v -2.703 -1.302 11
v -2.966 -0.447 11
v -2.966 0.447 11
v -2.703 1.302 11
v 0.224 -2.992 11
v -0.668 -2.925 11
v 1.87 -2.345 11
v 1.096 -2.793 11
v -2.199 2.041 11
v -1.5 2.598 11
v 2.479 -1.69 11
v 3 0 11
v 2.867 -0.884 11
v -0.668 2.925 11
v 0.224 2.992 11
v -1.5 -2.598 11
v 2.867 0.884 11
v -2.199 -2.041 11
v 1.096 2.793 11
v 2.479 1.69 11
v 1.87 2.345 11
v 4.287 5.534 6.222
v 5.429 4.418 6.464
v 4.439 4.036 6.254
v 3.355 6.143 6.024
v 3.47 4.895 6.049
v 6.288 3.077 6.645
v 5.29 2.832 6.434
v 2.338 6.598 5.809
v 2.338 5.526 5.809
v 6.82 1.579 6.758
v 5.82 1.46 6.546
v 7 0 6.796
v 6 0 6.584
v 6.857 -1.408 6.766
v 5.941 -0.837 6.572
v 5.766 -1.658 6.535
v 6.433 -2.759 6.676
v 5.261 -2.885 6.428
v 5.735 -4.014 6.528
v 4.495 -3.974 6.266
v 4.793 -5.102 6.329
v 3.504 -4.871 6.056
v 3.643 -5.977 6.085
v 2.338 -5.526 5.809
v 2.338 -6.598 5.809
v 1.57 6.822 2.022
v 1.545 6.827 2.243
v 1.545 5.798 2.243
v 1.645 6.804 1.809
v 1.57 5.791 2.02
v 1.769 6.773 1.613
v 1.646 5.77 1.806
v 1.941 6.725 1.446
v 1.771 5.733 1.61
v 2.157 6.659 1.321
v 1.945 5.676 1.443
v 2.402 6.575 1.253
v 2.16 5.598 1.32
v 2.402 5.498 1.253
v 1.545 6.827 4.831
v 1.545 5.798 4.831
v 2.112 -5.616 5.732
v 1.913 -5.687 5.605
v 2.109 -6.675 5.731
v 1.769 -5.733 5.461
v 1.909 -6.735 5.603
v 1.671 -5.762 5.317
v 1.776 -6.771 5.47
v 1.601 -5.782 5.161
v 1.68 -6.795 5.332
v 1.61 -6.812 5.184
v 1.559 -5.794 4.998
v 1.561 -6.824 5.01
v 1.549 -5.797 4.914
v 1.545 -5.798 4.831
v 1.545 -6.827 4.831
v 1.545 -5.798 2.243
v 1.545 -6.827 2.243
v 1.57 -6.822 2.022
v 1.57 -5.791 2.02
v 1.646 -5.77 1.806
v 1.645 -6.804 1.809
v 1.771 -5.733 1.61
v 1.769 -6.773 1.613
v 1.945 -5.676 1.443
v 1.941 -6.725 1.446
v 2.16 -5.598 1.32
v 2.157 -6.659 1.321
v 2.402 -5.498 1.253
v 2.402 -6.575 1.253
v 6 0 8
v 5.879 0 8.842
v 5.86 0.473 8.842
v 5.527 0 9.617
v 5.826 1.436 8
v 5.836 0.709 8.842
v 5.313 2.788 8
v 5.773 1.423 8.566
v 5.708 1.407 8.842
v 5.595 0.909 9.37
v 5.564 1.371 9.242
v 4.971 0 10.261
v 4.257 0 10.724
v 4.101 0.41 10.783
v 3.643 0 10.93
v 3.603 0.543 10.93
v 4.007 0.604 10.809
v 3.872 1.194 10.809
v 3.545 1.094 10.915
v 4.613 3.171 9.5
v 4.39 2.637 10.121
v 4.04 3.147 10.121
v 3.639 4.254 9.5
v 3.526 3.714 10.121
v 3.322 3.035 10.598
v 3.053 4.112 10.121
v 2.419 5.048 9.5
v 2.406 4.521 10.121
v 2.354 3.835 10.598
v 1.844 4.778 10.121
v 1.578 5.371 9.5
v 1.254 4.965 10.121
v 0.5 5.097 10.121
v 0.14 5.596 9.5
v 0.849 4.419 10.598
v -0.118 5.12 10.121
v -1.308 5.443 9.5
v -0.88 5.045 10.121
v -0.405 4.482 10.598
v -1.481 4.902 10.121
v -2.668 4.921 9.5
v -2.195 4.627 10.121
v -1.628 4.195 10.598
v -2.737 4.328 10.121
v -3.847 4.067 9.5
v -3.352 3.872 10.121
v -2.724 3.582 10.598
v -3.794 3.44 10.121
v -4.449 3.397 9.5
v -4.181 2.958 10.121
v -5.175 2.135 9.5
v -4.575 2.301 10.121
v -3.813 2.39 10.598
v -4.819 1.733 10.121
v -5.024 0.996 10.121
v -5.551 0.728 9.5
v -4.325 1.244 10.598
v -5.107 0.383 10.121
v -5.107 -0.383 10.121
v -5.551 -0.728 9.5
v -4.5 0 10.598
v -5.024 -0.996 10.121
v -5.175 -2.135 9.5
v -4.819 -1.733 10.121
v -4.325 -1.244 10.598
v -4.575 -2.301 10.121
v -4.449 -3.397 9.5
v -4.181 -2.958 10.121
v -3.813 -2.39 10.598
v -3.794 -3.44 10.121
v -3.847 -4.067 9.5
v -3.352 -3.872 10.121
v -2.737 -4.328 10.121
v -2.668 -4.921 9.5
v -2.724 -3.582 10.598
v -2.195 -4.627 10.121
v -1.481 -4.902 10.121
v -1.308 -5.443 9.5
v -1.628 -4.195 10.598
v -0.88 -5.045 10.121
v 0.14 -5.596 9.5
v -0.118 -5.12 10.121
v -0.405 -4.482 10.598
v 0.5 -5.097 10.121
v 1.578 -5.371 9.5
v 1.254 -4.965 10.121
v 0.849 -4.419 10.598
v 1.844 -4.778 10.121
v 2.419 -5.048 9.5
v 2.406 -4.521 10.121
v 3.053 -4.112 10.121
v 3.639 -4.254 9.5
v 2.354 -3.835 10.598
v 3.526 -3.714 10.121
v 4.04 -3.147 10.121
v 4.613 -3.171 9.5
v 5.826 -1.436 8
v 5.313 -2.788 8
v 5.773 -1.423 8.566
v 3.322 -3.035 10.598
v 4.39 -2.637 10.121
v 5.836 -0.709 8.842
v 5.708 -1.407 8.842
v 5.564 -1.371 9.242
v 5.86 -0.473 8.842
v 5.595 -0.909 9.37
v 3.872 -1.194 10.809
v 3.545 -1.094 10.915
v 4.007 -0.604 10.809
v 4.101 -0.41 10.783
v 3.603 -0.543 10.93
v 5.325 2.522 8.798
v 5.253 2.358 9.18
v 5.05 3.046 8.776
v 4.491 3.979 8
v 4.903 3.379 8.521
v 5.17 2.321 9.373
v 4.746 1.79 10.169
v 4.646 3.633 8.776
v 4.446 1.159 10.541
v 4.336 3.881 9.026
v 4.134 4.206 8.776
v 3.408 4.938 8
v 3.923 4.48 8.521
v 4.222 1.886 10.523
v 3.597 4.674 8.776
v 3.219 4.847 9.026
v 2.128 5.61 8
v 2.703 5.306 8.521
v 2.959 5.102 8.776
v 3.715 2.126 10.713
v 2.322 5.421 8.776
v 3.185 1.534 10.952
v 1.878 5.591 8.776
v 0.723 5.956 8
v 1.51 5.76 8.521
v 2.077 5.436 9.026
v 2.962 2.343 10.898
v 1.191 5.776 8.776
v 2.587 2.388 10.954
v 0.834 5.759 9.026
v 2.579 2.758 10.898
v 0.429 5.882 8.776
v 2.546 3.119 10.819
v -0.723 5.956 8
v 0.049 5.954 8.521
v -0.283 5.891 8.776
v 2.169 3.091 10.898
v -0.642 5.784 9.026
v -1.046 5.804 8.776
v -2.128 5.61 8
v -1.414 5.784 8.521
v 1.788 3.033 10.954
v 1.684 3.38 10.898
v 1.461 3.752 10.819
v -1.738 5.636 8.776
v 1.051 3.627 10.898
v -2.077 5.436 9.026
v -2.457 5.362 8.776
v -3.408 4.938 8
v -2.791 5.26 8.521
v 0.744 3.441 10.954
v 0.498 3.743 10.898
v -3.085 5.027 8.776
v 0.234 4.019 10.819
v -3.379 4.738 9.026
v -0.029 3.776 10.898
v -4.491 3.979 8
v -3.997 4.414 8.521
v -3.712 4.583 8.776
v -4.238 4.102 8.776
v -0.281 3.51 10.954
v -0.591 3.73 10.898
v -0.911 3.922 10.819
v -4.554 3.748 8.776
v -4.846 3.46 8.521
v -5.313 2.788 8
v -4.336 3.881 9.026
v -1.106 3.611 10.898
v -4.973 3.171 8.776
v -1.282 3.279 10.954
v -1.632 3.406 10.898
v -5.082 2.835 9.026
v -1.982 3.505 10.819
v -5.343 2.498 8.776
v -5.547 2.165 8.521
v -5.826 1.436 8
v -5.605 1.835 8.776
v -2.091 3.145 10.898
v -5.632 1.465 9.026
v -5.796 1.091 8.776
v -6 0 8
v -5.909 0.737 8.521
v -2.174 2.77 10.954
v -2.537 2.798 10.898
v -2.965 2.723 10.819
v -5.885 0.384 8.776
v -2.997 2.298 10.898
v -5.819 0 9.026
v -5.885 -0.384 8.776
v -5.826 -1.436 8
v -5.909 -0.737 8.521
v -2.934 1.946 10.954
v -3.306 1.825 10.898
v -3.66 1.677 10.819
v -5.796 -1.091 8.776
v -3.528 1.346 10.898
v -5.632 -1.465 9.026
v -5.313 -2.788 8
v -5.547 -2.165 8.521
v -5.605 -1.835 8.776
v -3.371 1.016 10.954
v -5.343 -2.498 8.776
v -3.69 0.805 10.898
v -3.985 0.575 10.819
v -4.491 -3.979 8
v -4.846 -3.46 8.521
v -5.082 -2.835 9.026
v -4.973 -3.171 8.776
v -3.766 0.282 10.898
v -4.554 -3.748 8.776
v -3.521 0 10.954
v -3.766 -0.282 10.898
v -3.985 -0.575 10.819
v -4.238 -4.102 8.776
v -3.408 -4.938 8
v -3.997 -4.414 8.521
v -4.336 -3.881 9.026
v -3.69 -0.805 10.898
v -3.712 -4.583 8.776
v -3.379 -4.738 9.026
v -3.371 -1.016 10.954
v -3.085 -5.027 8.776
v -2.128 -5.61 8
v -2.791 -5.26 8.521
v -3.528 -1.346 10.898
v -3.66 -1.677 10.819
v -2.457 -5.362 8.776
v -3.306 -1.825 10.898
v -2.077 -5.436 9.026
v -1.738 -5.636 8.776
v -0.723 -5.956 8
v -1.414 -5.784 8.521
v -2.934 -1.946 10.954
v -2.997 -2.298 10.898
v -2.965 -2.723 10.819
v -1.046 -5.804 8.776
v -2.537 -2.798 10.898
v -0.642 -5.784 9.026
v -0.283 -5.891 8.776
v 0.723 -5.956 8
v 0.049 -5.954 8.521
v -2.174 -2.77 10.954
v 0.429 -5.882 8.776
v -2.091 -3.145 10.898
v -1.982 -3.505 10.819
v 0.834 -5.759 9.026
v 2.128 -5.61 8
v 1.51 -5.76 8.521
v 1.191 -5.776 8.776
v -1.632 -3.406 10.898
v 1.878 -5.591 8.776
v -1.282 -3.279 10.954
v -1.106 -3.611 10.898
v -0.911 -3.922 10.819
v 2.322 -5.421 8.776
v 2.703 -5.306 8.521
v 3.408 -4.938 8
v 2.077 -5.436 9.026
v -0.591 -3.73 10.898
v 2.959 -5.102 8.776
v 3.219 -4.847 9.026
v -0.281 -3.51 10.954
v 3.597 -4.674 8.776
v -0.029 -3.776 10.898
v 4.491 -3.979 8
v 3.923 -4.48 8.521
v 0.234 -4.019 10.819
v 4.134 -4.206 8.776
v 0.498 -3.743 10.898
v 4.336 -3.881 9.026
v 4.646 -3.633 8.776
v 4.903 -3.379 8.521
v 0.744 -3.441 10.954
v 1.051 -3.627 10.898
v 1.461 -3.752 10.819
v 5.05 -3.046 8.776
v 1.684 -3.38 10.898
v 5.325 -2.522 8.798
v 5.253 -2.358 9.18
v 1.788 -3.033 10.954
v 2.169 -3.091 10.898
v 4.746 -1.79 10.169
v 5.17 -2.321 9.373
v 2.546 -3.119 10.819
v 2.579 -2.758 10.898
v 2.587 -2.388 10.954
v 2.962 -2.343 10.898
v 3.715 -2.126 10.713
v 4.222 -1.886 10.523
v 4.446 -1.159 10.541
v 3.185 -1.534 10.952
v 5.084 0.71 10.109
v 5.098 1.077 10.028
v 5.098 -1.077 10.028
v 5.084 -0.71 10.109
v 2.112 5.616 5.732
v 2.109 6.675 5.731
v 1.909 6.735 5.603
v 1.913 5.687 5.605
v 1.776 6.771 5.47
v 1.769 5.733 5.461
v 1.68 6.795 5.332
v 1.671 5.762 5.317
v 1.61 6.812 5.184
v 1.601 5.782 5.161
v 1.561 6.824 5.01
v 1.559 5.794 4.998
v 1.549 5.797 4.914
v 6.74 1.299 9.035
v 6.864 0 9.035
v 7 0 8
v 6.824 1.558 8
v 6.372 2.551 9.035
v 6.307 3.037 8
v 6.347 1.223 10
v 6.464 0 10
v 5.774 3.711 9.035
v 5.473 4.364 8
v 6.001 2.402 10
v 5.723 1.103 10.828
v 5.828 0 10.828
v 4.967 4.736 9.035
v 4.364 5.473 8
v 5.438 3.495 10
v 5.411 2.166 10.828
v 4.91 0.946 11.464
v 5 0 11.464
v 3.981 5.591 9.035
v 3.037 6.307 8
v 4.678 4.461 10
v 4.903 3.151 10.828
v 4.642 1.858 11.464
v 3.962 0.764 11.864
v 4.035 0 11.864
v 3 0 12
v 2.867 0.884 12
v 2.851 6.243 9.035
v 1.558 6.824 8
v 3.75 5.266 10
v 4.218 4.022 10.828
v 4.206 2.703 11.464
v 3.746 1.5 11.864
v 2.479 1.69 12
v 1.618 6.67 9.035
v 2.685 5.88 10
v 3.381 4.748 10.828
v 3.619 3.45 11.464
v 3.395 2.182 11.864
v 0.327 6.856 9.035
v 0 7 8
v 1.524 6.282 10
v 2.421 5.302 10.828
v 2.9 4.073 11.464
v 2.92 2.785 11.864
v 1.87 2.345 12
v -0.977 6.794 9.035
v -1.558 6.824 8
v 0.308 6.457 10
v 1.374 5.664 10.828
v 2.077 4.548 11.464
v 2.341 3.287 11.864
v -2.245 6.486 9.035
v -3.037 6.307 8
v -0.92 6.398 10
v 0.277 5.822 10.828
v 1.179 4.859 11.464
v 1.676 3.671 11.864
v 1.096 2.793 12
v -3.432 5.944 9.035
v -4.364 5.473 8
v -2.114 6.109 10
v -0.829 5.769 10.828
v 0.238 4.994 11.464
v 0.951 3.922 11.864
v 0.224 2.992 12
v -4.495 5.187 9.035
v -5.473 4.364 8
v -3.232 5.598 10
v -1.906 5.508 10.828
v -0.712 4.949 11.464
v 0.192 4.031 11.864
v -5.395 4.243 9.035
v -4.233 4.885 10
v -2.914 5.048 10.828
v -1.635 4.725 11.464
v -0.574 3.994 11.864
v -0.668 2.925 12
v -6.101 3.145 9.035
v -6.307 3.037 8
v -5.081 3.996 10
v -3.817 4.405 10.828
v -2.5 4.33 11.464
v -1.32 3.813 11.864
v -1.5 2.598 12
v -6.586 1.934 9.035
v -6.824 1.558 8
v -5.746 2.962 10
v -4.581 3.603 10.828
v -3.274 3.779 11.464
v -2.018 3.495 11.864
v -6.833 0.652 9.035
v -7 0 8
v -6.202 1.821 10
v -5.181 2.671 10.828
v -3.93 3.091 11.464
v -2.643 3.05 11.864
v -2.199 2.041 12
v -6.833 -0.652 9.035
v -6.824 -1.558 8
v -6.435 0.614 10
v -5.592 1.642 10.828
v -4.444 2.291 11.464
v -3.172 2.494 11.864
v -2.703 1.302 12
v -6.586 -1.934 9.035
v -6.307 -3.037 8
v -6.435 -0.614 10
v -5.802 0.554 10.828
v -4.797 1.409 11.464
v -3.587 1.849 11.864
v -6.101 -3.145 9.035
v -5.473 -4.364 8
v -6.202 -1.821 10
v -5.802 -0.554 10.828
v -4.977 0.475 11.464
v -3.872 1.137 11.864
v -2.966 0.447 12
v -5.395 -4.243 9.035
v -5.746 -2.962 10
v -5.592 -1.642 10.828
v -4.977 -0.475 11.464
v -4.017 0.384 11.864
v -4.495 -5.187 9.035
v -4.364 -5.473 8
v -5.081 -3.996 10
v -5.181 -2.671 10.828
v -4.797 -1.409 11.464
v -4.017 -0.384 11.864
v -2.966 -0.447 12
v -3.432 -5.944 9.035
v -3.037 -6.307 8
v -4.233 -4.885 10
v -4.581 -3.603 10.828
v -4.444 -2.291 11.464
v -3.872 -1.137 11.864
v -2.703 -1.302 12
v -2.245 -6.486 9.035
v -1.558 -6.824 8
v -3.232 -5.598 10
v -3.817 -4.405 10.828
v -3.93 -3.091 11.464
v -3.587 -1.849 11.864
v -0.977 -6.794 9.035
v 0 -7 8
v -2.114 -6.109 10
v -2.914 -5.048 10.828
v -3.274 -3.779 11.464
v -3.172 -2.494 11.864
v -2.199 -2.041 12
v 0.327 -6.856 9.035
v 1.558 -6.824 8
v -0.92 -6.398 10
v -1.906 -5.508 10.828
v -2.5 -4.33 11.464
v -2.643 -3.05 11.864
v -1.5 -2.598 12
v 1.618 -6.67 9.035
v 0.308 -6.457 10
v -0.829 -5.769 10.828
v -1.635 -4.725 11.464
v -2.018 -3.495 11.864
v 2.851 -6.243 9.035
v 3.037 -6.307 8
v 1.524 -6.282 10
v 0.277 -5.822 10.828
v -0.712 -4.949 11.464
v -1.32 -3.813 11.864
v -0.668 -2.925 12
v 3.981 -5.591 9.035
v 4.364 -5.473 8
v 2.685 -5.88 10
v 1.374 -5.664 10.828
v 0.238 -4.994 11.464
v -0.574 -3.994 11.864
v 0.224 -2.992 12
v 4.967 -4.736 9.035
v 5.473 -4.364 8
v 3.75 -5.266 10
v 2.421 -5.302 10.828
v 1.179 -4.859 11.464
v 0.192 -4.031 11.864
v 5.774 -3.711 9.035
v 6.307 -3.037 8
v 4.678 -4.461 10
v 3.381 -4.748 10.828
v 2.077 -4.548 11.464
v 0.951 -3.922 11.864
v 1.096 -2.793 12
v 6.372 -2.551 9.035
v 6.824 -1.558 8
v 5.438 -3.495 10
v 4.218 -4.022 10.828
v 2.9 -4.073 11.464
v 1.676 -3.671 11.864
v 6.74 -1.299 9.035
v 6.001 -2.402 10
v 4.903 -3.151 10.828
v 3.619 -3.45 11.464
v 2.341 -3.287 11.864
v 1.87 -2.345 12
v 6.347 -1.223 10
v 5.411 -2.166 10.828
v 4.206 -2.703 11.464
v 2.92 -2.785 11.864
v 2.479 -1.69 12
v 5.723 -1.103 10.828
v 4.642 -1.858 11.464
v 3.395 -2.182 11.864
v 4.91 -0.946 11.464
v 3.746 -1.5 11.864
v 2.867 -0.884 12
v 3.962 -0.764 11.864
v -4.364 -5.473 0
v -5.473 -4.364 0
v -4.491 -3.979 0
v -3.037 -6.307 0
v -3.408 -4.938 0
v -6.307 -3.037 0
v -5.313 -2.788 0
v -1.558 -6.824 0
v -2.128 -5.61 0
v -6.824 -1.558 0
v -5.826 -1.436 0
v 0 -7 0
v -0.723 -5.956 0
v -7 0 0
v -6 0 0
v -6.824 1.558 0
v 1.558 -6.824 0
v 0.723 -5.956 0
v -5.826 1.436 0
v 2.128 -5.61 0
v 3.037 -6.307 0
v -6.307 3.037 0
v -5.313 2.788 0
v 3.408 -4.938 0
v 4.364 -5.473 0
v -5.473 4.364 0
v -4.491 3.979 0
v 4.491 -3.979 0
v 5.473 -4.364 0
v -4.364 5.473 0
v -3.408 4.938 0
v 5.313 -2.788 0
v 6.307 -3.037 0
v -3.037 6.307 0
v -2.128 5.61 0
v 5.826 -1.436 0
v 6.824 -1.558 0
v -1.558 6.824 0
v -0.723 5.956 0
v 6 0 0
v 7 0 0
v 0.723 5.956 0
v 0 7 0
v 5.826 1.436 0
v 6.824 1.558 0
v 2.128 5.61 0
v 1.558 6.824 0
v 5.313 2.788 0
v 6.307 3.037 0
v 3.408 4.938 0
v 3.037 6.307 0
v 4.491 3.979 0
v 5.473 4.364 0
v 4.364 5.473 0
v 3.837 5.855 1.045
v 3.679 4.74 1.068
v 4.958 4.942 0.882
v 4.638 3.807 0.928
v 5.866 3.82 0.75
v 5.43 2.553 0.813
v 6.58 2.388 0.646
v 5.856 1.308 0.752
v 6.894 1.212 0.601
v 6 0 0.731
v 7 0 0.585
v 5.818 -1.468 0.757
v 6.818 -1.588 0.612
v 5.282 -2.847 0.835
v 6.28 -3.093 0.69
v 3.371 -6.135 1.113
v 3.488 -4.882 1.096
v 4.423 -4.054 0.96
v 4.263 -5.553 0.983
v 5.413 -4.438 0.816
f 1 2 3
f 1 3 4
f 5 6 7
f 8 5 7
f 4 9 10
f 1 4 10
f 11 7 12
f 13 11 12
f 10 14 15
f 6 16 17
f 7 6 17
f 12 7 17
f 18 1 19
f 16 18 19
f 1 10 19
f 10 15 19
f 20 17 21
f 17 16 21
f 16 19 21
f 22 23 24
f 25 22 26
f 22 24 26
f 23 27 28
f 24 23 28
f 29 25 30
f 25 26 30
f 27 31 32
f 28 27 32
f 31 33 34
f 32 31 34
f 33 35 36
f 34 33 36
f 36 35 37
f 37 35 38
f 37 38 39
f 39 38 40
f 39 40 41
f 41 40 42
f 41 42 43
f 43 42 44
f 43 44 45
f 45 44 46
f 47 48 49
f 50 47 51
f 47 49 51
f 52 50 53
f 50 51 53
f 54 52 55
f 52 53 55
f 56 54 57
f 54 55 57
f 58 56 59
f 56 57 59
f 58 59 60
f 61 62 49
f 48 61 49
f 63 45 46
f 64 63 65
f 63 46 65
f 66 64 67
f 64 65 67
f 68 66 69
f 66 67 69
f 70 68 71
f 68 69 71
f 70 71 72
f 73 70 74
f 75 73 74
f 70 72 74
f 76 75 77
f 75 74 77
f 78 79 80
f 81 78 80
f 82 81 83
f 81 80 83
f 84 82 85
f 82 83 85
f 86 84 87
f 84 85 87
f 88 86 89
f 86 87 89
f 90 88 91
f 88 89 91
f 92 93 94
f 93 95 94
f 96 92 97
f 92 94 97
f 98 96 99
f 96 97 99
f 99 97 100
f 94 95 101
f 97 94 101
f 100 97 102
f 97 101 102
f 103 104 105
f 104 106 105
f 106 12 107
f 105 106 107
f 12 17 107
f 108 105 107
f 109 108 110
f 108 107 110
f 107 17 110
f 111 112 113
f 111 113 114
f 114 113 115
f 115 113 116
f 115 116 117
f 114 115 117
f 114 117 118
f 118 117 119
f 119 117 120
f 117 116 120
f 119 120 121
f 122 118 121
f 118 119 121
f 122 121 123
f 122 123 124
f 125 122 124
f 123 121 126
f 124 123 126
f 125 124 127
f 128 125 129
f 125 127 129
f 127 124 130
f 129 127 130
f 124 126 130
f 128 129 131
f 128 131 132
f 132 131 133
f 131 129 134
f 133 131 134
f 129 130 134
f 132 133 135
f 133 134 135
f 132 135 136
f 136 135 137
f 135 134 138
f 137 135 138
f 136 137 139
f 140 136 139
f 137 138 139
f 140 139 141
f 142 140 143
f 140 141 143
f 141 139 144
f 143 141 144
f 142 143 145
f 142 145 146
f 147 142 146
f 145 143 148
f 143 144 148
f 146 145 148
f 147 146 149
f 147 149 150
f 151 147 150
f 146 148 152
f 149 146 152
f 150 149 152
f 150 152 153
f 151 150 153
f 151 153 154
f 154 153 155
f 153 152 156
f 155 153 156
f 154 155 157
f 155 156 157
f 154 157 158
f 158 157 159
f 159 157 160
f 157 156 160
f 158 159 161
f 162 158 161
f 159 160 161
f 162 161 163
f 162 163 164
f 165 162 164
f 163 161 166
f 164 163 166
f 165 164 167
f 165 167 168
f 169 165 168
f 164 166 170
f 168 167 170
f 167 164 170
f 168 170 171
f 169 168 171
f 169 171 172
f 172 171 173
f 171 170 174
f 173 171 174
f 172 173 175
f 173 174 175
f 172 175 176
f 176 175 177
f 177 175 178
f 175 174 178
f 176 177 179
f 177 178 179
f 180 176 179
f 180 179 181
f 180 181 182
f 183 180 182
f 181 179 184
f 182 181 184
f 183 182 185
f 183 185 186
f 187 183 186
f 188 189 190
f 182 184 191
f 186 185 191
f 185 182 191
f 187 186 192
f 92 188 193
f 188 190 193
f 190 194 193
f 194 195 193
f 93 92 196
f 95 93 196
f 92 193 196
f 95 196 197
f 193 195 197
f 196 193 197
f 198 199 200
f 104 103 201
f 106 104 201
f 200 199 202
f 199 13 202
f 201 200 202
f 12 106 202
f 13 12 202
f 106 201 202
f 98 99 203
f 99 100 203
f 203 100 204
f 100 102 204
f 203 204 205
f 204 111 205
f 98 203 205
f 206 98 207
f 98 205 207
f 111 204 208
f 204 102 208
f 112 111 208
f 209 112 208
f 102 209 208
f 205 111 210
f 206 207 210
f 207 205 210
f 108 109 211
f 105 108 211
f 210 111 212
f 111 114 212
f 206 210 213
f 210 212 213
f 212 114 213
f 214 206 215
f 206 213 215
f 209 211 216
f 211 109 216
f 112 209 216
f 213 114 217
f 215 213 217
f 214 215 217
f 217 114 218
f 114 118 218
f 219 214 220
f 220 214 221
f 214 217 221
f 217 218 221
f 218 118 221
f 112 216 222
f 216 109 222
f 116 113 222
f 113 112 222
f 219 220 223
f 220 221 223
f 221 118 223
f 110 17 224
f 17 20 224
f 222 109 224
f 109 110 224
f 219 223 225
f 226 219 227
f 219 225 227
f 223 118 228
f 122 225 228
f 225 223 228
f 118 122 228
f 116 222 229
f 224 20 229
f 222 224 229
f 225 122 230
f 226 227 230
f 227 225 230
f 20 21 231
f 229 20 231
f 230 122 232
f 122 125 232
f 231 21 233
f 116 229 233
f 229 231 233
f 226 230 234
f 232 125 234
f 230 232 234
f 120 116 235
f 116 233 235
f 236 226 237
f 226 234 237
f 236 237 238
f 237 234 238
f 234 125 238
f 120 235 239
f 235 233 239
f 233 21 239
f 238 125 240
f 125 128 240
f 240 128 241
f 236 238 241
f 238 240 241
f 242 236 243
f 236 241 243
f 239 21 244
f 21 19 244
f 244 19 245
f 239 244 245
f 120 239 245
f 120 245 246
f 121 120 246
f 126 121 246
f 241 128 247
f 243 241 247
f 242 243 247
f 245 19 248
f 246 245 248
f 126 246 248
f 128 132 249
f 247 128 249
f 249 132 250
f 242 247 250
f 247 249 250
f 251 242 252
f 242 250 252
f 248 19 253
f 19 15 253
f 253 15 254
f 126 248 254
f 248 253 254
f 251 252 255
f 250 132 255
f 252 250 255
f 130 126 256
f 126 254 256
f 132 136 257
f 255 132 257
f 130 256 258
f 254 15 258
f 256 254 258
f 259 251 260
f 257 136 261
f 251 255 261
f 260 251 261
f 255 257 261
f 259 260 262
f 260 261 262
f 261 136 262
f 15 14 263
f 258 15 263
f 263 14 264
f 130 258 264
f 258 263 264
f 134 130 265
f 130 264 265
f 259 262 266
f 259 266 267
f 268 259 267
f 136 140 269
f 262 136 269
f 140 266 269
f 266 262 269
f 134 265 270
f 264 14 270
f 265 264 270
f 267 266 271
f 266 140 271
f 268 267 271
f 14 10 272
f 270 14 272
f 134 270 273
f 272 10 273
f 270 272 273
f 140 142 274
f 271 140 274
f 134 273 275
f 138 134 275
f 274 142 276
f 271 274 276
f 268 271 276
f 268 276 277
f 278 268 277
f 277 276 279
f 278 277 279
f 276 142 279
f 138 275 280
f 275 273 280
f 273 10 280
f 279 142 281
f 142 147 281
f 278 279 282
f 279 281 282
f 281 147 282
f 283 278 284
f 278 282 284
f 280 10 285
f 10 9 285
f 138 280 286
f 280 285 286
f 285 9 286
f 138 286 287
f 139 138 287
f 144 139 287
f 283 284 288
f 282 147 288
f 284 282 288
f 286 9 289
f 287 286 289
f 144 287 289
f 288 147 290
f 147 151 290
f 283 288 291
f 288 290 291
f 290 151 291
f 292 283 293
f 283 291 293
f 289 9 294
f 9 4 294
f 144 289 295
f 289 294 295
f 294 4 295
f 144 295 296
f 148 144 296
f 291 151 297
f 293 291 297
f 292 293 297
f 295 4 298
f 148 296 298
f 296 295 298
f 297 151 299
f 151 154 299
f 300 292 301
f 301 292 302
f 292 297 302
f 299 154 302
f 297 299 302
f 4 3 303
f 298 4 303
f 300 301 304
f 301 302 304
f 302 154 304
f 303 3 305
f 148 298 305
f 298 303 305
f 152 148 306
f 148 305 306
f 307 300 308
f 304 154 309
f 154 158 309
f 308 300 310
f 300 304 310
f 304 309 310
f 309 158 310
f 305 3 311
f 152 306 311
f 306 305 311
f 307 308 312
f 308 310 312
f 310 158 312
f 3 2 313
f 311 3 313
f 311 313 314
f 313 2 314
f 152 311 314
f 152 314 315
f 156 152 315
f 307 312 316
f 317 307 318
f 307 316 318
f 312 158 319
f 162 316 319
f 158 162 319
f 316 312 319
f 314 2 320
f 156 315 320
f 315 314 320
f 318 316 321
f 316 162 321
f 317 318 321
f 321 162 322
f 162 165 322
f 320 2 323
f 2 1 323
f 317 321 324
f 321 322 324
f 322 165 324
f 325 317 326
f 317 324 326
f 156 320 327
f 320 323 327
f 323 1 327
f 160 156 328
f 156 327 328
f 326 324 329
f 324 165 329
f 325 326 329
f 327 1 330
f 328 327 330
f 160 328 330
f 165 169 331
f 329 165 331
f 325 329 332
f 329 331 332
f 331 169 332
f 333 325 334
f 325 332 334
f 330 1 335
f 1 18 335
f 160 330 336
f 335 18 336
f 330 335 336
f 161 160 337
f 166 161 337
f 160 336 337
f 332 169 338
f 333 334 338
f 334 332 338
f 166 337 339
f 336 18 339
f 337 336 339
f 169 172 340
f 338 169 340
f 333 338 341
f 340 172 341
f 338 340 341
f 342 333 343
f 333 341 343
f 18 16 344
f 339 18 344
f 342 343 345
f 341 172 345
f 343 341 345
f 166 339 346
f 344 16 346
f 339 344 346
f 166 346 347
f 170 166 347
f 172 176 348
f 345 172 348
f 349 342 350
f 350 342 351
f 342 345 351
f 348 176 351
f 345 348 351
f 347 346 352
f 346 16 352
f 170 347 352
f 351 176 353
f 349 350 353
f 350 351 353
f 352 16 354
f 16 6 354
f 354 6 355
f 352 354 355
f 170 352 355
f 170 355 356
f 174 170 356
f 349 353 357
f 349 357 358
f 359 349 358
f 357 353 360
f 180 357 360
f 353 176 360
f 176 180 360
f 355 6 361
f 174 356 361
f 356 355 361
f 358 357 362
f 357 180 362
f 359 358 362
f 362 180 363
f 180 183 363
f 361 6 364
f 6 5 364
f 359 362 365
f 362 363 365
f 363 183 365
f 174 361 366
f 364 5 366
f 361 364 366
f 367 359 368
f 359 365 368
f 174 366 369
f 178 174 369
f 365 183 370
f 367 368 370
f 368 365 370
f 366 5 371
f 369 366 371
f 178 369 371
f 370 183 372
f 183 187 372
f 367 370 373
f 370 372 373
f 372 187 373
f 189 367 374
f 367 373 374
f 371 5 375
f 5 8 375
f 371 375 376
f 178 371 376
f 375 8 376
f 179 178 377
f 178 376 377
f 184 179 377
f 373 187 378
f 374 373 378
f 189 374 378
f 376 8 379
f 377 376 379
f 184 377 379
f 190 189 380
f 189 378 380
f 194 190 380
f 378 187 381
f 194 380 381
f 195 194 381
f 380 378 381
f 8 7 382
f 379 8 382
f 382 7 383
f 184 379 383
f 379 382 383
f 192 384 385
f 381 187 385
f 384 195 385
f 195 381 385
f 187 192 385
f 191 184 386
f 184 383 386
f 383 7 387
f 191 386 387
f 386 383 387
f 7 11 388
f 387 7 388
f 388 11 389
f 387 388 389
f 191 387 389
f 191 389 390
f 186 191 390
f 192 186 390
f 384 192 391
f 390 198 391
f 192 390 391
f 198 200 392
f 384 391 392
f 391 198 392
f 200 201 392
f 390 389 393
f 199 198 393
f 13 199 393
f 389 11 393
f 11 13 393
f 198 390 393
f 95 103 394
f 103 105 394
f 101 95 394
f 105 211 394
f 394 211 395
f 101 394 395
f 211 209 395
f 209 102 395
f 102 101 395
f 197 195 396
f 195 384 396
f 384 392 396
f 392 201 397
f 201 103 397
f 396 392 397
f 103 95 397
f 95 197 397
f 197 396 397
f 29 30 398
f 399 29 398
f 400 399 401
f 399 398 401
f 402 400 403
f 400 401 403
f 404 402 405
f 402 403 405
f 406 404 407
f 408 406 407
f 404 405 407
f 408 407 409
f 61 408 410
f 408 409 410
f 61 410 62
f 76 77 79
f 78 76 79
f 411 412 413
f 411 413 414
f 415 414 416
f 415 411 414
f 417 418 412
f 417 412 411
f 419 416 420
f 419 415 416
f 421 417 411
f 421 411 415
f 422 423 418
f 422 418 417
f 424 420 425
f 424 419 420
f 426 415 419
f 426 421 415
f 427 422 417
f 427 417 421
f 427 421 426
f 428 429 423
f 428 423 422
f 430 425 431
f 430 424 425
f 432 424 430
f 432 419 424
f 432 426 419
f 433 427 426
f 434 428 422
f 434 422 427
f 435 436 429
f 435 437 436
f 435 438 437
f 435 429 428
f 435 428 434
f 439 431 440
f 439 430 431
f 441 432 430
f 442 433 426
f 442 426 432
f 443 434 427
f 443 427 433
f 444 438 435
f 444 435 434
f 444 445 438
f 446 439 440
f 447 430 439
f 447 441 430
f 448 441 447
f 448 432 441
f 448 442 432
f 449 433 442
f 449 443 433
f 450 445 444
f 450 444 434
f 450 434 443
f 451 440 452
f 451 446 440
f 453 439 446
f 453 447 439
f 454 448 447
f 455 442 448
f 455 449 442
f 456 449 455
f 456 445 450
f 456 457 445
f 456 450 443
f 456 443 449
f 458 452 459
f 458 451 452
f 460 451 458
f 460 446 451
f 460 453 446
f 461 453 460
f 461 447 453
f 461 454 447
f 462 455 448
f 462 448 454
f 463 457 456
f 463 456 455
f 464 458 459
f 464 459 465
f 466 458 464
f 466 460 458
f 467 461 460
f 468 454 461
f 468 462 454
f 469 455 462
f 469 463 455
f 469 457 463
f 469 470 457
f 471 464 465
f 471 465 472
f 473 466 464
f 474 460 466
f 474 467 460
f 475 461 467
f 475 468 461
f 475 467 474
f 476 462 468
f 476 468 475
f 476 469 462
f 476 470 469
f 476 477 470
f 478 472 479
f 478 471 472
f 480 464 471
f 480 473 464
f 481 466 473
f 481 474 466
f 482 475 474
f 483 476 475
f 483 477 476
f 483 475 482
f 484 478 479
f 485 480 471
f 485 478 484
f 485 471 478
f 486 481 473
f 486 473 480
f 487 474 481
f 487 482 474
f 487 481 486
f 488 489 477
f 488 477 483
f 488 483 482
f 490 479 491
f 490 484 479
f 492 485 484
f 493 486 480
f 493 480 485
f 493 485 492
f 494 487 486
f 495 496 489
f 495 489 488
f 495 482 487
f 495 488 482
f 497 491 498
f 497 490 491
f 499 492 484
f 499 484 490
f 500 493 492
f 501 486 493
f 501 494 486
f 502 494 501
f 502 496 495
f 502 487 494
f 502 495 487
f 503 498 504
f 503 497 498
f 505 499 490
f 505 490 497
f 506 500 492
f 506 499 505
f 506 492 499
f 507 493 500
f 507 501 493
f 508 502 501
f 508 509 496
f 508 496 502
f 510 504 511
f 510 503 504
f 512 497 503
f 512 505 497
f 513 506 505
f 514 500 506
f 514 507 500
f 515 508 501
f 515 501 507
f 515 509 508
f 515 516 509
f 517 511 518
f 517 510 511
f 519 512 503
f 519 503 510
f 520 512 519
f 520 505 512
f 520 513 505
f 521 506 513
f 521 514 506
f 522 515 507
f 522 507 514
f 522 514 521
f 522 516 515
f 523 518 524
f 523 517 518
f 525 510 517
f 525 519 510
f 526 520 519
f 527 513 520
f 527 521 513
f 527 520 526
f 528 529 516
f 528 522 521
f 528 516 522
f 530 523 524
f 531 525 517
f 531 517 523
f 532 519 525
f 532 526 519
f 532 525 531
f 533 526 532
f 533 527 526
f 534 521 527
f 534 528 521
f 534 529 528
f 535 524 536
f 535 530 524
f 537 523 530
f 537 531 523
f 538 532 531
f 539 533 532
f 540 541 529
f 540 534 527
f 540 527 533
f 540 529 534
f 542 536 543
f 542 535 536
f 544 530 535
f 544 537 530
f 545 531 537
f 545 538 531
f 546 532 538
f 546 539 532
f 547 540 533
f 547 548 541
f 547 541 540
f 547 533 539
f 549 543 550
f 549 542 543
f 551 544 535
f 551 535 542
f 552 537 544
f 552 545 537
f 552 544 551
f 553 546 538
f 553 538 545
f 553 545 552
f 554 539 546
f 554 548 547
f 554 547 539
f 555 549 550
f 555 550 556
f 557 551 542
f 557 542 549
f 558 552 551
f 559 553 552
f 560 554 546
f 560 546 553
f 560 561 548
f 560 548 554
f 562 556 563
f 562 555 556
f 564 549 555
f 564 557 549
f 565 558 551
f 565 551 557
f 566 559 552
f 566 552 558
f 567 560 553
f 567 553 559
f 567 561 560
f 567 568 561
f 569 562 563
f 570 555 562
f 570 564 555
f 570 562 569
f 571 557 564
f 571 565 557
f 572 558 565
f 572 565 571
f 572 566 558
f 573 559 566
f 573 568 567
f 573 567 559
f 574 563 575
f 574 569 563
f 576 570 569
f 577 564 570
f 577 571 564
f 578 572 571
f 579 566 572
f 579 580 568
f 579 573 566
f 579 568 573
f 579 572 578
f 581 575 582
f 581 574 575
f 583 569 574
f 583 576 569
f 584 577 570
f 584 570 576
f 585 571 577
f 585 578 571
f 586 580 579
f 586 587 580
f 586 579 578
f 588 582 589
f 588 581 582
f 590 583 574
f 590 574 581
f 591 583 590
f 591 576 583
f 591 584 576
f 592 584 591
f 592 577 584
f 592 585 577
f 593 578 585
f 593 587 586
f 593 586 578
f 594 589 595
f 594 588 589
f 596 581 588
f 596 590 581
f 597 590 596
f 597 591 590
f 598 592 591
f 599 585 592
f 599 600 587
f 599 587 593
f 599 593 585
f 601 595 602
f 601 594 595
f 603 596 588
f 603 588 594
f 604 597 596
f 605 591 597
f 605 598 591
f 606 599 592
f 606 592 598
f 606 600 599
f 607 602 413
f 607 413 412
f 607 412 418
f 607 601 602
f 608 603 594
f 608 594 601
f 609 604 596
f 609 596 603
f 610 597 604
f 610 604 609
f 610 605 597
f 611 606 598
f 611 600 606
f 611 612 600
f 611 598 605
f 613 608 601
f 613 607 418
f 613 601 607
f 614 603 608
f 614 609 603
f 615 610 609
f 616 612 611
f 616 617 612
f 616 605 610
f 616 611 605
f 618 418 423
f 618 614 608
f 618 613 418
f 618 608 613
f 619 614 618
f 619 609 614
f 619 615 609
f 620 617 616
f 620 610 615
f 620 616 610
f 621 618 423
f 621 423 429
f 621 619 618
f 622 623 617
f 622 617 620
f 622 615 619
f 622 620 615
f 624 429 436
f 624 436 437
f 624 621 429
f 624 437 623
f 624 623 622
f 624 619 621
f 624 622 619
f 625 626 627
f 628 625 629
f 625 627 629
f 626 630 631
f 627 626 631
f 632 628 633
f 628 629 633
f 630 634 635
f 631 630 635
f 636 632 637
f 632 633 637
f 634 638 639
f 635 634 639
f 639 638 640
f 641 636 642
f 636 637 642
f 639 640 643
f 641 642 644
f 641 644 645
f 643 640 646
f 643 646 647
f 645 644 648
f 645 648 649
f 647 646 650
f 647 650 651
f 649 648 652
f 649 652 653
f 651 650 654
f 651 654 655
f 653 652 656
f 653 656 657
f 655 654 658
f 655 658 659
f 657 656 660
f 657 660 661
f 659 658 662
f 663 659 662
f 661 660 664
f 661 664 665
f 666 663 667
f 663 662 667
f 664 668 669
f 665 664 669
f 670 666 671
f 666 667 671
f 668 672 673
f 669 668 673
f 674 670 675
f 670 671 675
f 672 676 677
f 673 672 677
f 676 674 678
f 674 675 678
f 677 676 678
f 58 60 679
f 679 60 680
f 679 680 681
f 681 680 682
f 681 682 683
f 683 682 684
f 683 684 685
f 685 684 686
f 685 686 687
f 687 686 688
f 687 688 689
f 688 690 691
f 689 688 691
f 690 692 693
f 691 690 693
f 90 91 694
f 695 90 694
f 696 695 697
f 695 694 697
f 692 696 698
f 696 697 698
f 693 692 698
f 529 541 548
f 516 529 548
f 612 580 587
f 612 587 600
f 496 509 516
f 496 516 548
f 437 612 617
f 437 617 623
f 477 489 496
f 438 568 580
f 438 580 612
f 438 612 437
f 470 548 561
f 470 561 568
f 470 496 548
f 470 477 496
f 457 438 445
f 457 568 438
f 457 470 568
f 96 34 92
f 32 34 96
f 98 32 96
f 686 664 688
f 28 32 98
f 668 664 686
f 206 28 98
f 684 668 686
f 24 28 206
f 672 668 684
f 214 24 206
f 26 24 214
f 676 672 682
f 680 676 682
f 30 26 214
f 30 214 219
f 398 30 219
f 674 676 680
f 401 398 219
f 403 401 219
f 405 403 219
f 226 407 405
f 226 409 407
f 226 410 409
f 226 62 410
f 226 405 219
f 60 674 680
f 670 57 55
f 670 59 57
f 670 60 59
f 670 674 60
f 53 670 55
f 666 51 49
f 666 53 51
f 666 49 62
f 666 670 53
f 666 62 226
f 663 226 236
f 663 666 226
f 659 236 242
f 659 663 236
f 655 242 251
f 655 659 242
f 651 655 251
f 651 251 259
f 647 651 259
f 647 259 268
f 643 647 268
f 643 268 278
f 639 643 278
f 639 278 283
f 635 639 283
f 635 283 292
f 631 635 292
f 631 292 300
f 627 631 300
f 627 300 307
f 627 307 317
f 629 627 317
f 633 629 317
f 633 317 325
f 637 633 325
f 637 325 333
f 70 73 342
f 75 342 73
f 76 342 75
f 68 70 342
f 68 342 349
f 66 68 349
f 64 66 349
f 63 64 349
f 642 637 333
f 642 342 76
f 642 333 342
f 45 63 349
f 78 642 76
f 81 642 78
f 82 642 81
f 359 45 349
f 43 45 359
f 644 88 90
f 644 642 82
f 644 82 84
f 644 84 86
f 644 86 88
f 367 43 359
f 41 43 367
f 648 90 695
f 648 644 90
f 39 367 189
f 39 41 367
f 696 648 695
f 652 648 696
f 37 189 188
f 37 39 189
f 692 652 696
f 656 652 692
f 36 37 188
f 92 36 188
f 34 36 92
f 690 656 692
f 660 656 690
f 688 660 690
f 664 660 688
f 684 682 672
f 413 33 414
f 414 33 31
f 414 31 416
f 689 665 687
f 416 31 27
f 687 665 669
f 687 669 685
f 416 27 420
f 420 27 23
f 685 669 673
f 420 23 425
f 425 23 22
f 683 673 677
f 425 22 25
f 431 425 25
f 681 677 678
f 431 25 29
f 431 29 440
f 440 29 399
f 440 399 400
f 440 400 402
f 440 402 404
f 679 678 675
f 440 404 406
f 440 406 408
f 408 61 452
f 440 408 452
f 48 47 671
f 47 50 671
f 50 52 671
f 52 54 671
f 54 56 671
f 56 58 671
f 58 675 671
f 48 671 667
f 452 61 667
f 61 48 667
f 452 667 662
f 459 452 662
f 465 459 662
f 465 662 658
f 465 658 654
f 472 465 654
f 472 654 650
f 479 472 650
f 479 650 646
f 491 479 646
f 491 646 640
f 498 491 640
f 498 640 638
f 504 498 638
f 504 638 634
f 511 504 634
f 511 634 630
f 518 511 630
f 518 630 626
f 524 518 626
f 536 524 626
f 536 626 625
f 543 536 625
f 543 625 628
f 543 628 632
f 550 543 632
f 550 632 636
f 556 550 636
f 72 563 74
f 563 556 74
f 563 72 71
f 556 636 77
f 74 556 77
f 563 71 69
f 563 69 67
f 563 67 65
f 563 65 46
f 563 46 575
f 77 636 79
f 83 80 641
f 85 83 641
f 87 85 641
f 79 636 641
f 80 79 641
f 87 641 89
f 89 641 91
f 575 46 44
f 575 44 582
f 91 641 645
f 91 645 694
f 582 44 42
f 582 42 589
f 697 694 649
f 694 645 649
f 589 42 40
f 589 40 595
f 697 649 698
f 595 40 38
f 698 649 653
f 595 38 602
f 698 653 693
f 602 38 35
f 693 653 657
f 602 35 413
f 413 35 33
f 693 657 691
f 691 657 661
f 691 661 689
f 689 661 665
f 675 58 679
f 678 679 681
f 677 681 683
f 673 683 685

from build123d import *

# Parameters (mm, degrees)
F0_R     = 7
F1_DEPTH = 12
F2_R     = 4
F3_T     = -1
F5_DEPTH = 12.7


with BuildPart() as f1:
    # F0 (on Top) → F1 (new body)
    with BuildSketch(Plane.XY):
        Circle(F0_R)
    extrude(amount=F1_DEPTH)

    # F2
    f2_edges = [f1.edges().sort_by_distance(p)[0] for p in [
        (-7, 0, 12),
    ]]
    fillet(f2_edges, radius=F2_R)

    # F3
    f3_openings = [f1.faces().sort_by_distance(p)[0] for p in [
        (0, 0, 0),
    ]]
    offset(amount=F3_T, openings=f3_openings)

    # F4 (on Front) → F5 (cut, symmetric)
    with BuildSketch(Plane.XZ):
        with BuildLine():
            Line((8.120851, 6.698599), (8.229394, 7.056202))
            Line((8.229394, 7.056202), (2.338248, 5.809171))
            ThreePointArc((2.338248, 5.809171), (1.768457, 5.460496), (1.545338, 4.830849))
            Line((1.545338, 4.830849), (1.545338, 2.243015))
            ThreePointArc((1.545338, 2.243015), (1.789101, 1.588718), (2.401549, 1.253407))
            Line((2.401549, 1.253407), (7.227779, 0.55216))
            Line((7.227779, 0.55216), (8.120851, 6.698599))
        make_face()
    extrude(amount=F5_DEPTH, both=True, mode=Mode.SUBTRACT)


solid = f1.part
